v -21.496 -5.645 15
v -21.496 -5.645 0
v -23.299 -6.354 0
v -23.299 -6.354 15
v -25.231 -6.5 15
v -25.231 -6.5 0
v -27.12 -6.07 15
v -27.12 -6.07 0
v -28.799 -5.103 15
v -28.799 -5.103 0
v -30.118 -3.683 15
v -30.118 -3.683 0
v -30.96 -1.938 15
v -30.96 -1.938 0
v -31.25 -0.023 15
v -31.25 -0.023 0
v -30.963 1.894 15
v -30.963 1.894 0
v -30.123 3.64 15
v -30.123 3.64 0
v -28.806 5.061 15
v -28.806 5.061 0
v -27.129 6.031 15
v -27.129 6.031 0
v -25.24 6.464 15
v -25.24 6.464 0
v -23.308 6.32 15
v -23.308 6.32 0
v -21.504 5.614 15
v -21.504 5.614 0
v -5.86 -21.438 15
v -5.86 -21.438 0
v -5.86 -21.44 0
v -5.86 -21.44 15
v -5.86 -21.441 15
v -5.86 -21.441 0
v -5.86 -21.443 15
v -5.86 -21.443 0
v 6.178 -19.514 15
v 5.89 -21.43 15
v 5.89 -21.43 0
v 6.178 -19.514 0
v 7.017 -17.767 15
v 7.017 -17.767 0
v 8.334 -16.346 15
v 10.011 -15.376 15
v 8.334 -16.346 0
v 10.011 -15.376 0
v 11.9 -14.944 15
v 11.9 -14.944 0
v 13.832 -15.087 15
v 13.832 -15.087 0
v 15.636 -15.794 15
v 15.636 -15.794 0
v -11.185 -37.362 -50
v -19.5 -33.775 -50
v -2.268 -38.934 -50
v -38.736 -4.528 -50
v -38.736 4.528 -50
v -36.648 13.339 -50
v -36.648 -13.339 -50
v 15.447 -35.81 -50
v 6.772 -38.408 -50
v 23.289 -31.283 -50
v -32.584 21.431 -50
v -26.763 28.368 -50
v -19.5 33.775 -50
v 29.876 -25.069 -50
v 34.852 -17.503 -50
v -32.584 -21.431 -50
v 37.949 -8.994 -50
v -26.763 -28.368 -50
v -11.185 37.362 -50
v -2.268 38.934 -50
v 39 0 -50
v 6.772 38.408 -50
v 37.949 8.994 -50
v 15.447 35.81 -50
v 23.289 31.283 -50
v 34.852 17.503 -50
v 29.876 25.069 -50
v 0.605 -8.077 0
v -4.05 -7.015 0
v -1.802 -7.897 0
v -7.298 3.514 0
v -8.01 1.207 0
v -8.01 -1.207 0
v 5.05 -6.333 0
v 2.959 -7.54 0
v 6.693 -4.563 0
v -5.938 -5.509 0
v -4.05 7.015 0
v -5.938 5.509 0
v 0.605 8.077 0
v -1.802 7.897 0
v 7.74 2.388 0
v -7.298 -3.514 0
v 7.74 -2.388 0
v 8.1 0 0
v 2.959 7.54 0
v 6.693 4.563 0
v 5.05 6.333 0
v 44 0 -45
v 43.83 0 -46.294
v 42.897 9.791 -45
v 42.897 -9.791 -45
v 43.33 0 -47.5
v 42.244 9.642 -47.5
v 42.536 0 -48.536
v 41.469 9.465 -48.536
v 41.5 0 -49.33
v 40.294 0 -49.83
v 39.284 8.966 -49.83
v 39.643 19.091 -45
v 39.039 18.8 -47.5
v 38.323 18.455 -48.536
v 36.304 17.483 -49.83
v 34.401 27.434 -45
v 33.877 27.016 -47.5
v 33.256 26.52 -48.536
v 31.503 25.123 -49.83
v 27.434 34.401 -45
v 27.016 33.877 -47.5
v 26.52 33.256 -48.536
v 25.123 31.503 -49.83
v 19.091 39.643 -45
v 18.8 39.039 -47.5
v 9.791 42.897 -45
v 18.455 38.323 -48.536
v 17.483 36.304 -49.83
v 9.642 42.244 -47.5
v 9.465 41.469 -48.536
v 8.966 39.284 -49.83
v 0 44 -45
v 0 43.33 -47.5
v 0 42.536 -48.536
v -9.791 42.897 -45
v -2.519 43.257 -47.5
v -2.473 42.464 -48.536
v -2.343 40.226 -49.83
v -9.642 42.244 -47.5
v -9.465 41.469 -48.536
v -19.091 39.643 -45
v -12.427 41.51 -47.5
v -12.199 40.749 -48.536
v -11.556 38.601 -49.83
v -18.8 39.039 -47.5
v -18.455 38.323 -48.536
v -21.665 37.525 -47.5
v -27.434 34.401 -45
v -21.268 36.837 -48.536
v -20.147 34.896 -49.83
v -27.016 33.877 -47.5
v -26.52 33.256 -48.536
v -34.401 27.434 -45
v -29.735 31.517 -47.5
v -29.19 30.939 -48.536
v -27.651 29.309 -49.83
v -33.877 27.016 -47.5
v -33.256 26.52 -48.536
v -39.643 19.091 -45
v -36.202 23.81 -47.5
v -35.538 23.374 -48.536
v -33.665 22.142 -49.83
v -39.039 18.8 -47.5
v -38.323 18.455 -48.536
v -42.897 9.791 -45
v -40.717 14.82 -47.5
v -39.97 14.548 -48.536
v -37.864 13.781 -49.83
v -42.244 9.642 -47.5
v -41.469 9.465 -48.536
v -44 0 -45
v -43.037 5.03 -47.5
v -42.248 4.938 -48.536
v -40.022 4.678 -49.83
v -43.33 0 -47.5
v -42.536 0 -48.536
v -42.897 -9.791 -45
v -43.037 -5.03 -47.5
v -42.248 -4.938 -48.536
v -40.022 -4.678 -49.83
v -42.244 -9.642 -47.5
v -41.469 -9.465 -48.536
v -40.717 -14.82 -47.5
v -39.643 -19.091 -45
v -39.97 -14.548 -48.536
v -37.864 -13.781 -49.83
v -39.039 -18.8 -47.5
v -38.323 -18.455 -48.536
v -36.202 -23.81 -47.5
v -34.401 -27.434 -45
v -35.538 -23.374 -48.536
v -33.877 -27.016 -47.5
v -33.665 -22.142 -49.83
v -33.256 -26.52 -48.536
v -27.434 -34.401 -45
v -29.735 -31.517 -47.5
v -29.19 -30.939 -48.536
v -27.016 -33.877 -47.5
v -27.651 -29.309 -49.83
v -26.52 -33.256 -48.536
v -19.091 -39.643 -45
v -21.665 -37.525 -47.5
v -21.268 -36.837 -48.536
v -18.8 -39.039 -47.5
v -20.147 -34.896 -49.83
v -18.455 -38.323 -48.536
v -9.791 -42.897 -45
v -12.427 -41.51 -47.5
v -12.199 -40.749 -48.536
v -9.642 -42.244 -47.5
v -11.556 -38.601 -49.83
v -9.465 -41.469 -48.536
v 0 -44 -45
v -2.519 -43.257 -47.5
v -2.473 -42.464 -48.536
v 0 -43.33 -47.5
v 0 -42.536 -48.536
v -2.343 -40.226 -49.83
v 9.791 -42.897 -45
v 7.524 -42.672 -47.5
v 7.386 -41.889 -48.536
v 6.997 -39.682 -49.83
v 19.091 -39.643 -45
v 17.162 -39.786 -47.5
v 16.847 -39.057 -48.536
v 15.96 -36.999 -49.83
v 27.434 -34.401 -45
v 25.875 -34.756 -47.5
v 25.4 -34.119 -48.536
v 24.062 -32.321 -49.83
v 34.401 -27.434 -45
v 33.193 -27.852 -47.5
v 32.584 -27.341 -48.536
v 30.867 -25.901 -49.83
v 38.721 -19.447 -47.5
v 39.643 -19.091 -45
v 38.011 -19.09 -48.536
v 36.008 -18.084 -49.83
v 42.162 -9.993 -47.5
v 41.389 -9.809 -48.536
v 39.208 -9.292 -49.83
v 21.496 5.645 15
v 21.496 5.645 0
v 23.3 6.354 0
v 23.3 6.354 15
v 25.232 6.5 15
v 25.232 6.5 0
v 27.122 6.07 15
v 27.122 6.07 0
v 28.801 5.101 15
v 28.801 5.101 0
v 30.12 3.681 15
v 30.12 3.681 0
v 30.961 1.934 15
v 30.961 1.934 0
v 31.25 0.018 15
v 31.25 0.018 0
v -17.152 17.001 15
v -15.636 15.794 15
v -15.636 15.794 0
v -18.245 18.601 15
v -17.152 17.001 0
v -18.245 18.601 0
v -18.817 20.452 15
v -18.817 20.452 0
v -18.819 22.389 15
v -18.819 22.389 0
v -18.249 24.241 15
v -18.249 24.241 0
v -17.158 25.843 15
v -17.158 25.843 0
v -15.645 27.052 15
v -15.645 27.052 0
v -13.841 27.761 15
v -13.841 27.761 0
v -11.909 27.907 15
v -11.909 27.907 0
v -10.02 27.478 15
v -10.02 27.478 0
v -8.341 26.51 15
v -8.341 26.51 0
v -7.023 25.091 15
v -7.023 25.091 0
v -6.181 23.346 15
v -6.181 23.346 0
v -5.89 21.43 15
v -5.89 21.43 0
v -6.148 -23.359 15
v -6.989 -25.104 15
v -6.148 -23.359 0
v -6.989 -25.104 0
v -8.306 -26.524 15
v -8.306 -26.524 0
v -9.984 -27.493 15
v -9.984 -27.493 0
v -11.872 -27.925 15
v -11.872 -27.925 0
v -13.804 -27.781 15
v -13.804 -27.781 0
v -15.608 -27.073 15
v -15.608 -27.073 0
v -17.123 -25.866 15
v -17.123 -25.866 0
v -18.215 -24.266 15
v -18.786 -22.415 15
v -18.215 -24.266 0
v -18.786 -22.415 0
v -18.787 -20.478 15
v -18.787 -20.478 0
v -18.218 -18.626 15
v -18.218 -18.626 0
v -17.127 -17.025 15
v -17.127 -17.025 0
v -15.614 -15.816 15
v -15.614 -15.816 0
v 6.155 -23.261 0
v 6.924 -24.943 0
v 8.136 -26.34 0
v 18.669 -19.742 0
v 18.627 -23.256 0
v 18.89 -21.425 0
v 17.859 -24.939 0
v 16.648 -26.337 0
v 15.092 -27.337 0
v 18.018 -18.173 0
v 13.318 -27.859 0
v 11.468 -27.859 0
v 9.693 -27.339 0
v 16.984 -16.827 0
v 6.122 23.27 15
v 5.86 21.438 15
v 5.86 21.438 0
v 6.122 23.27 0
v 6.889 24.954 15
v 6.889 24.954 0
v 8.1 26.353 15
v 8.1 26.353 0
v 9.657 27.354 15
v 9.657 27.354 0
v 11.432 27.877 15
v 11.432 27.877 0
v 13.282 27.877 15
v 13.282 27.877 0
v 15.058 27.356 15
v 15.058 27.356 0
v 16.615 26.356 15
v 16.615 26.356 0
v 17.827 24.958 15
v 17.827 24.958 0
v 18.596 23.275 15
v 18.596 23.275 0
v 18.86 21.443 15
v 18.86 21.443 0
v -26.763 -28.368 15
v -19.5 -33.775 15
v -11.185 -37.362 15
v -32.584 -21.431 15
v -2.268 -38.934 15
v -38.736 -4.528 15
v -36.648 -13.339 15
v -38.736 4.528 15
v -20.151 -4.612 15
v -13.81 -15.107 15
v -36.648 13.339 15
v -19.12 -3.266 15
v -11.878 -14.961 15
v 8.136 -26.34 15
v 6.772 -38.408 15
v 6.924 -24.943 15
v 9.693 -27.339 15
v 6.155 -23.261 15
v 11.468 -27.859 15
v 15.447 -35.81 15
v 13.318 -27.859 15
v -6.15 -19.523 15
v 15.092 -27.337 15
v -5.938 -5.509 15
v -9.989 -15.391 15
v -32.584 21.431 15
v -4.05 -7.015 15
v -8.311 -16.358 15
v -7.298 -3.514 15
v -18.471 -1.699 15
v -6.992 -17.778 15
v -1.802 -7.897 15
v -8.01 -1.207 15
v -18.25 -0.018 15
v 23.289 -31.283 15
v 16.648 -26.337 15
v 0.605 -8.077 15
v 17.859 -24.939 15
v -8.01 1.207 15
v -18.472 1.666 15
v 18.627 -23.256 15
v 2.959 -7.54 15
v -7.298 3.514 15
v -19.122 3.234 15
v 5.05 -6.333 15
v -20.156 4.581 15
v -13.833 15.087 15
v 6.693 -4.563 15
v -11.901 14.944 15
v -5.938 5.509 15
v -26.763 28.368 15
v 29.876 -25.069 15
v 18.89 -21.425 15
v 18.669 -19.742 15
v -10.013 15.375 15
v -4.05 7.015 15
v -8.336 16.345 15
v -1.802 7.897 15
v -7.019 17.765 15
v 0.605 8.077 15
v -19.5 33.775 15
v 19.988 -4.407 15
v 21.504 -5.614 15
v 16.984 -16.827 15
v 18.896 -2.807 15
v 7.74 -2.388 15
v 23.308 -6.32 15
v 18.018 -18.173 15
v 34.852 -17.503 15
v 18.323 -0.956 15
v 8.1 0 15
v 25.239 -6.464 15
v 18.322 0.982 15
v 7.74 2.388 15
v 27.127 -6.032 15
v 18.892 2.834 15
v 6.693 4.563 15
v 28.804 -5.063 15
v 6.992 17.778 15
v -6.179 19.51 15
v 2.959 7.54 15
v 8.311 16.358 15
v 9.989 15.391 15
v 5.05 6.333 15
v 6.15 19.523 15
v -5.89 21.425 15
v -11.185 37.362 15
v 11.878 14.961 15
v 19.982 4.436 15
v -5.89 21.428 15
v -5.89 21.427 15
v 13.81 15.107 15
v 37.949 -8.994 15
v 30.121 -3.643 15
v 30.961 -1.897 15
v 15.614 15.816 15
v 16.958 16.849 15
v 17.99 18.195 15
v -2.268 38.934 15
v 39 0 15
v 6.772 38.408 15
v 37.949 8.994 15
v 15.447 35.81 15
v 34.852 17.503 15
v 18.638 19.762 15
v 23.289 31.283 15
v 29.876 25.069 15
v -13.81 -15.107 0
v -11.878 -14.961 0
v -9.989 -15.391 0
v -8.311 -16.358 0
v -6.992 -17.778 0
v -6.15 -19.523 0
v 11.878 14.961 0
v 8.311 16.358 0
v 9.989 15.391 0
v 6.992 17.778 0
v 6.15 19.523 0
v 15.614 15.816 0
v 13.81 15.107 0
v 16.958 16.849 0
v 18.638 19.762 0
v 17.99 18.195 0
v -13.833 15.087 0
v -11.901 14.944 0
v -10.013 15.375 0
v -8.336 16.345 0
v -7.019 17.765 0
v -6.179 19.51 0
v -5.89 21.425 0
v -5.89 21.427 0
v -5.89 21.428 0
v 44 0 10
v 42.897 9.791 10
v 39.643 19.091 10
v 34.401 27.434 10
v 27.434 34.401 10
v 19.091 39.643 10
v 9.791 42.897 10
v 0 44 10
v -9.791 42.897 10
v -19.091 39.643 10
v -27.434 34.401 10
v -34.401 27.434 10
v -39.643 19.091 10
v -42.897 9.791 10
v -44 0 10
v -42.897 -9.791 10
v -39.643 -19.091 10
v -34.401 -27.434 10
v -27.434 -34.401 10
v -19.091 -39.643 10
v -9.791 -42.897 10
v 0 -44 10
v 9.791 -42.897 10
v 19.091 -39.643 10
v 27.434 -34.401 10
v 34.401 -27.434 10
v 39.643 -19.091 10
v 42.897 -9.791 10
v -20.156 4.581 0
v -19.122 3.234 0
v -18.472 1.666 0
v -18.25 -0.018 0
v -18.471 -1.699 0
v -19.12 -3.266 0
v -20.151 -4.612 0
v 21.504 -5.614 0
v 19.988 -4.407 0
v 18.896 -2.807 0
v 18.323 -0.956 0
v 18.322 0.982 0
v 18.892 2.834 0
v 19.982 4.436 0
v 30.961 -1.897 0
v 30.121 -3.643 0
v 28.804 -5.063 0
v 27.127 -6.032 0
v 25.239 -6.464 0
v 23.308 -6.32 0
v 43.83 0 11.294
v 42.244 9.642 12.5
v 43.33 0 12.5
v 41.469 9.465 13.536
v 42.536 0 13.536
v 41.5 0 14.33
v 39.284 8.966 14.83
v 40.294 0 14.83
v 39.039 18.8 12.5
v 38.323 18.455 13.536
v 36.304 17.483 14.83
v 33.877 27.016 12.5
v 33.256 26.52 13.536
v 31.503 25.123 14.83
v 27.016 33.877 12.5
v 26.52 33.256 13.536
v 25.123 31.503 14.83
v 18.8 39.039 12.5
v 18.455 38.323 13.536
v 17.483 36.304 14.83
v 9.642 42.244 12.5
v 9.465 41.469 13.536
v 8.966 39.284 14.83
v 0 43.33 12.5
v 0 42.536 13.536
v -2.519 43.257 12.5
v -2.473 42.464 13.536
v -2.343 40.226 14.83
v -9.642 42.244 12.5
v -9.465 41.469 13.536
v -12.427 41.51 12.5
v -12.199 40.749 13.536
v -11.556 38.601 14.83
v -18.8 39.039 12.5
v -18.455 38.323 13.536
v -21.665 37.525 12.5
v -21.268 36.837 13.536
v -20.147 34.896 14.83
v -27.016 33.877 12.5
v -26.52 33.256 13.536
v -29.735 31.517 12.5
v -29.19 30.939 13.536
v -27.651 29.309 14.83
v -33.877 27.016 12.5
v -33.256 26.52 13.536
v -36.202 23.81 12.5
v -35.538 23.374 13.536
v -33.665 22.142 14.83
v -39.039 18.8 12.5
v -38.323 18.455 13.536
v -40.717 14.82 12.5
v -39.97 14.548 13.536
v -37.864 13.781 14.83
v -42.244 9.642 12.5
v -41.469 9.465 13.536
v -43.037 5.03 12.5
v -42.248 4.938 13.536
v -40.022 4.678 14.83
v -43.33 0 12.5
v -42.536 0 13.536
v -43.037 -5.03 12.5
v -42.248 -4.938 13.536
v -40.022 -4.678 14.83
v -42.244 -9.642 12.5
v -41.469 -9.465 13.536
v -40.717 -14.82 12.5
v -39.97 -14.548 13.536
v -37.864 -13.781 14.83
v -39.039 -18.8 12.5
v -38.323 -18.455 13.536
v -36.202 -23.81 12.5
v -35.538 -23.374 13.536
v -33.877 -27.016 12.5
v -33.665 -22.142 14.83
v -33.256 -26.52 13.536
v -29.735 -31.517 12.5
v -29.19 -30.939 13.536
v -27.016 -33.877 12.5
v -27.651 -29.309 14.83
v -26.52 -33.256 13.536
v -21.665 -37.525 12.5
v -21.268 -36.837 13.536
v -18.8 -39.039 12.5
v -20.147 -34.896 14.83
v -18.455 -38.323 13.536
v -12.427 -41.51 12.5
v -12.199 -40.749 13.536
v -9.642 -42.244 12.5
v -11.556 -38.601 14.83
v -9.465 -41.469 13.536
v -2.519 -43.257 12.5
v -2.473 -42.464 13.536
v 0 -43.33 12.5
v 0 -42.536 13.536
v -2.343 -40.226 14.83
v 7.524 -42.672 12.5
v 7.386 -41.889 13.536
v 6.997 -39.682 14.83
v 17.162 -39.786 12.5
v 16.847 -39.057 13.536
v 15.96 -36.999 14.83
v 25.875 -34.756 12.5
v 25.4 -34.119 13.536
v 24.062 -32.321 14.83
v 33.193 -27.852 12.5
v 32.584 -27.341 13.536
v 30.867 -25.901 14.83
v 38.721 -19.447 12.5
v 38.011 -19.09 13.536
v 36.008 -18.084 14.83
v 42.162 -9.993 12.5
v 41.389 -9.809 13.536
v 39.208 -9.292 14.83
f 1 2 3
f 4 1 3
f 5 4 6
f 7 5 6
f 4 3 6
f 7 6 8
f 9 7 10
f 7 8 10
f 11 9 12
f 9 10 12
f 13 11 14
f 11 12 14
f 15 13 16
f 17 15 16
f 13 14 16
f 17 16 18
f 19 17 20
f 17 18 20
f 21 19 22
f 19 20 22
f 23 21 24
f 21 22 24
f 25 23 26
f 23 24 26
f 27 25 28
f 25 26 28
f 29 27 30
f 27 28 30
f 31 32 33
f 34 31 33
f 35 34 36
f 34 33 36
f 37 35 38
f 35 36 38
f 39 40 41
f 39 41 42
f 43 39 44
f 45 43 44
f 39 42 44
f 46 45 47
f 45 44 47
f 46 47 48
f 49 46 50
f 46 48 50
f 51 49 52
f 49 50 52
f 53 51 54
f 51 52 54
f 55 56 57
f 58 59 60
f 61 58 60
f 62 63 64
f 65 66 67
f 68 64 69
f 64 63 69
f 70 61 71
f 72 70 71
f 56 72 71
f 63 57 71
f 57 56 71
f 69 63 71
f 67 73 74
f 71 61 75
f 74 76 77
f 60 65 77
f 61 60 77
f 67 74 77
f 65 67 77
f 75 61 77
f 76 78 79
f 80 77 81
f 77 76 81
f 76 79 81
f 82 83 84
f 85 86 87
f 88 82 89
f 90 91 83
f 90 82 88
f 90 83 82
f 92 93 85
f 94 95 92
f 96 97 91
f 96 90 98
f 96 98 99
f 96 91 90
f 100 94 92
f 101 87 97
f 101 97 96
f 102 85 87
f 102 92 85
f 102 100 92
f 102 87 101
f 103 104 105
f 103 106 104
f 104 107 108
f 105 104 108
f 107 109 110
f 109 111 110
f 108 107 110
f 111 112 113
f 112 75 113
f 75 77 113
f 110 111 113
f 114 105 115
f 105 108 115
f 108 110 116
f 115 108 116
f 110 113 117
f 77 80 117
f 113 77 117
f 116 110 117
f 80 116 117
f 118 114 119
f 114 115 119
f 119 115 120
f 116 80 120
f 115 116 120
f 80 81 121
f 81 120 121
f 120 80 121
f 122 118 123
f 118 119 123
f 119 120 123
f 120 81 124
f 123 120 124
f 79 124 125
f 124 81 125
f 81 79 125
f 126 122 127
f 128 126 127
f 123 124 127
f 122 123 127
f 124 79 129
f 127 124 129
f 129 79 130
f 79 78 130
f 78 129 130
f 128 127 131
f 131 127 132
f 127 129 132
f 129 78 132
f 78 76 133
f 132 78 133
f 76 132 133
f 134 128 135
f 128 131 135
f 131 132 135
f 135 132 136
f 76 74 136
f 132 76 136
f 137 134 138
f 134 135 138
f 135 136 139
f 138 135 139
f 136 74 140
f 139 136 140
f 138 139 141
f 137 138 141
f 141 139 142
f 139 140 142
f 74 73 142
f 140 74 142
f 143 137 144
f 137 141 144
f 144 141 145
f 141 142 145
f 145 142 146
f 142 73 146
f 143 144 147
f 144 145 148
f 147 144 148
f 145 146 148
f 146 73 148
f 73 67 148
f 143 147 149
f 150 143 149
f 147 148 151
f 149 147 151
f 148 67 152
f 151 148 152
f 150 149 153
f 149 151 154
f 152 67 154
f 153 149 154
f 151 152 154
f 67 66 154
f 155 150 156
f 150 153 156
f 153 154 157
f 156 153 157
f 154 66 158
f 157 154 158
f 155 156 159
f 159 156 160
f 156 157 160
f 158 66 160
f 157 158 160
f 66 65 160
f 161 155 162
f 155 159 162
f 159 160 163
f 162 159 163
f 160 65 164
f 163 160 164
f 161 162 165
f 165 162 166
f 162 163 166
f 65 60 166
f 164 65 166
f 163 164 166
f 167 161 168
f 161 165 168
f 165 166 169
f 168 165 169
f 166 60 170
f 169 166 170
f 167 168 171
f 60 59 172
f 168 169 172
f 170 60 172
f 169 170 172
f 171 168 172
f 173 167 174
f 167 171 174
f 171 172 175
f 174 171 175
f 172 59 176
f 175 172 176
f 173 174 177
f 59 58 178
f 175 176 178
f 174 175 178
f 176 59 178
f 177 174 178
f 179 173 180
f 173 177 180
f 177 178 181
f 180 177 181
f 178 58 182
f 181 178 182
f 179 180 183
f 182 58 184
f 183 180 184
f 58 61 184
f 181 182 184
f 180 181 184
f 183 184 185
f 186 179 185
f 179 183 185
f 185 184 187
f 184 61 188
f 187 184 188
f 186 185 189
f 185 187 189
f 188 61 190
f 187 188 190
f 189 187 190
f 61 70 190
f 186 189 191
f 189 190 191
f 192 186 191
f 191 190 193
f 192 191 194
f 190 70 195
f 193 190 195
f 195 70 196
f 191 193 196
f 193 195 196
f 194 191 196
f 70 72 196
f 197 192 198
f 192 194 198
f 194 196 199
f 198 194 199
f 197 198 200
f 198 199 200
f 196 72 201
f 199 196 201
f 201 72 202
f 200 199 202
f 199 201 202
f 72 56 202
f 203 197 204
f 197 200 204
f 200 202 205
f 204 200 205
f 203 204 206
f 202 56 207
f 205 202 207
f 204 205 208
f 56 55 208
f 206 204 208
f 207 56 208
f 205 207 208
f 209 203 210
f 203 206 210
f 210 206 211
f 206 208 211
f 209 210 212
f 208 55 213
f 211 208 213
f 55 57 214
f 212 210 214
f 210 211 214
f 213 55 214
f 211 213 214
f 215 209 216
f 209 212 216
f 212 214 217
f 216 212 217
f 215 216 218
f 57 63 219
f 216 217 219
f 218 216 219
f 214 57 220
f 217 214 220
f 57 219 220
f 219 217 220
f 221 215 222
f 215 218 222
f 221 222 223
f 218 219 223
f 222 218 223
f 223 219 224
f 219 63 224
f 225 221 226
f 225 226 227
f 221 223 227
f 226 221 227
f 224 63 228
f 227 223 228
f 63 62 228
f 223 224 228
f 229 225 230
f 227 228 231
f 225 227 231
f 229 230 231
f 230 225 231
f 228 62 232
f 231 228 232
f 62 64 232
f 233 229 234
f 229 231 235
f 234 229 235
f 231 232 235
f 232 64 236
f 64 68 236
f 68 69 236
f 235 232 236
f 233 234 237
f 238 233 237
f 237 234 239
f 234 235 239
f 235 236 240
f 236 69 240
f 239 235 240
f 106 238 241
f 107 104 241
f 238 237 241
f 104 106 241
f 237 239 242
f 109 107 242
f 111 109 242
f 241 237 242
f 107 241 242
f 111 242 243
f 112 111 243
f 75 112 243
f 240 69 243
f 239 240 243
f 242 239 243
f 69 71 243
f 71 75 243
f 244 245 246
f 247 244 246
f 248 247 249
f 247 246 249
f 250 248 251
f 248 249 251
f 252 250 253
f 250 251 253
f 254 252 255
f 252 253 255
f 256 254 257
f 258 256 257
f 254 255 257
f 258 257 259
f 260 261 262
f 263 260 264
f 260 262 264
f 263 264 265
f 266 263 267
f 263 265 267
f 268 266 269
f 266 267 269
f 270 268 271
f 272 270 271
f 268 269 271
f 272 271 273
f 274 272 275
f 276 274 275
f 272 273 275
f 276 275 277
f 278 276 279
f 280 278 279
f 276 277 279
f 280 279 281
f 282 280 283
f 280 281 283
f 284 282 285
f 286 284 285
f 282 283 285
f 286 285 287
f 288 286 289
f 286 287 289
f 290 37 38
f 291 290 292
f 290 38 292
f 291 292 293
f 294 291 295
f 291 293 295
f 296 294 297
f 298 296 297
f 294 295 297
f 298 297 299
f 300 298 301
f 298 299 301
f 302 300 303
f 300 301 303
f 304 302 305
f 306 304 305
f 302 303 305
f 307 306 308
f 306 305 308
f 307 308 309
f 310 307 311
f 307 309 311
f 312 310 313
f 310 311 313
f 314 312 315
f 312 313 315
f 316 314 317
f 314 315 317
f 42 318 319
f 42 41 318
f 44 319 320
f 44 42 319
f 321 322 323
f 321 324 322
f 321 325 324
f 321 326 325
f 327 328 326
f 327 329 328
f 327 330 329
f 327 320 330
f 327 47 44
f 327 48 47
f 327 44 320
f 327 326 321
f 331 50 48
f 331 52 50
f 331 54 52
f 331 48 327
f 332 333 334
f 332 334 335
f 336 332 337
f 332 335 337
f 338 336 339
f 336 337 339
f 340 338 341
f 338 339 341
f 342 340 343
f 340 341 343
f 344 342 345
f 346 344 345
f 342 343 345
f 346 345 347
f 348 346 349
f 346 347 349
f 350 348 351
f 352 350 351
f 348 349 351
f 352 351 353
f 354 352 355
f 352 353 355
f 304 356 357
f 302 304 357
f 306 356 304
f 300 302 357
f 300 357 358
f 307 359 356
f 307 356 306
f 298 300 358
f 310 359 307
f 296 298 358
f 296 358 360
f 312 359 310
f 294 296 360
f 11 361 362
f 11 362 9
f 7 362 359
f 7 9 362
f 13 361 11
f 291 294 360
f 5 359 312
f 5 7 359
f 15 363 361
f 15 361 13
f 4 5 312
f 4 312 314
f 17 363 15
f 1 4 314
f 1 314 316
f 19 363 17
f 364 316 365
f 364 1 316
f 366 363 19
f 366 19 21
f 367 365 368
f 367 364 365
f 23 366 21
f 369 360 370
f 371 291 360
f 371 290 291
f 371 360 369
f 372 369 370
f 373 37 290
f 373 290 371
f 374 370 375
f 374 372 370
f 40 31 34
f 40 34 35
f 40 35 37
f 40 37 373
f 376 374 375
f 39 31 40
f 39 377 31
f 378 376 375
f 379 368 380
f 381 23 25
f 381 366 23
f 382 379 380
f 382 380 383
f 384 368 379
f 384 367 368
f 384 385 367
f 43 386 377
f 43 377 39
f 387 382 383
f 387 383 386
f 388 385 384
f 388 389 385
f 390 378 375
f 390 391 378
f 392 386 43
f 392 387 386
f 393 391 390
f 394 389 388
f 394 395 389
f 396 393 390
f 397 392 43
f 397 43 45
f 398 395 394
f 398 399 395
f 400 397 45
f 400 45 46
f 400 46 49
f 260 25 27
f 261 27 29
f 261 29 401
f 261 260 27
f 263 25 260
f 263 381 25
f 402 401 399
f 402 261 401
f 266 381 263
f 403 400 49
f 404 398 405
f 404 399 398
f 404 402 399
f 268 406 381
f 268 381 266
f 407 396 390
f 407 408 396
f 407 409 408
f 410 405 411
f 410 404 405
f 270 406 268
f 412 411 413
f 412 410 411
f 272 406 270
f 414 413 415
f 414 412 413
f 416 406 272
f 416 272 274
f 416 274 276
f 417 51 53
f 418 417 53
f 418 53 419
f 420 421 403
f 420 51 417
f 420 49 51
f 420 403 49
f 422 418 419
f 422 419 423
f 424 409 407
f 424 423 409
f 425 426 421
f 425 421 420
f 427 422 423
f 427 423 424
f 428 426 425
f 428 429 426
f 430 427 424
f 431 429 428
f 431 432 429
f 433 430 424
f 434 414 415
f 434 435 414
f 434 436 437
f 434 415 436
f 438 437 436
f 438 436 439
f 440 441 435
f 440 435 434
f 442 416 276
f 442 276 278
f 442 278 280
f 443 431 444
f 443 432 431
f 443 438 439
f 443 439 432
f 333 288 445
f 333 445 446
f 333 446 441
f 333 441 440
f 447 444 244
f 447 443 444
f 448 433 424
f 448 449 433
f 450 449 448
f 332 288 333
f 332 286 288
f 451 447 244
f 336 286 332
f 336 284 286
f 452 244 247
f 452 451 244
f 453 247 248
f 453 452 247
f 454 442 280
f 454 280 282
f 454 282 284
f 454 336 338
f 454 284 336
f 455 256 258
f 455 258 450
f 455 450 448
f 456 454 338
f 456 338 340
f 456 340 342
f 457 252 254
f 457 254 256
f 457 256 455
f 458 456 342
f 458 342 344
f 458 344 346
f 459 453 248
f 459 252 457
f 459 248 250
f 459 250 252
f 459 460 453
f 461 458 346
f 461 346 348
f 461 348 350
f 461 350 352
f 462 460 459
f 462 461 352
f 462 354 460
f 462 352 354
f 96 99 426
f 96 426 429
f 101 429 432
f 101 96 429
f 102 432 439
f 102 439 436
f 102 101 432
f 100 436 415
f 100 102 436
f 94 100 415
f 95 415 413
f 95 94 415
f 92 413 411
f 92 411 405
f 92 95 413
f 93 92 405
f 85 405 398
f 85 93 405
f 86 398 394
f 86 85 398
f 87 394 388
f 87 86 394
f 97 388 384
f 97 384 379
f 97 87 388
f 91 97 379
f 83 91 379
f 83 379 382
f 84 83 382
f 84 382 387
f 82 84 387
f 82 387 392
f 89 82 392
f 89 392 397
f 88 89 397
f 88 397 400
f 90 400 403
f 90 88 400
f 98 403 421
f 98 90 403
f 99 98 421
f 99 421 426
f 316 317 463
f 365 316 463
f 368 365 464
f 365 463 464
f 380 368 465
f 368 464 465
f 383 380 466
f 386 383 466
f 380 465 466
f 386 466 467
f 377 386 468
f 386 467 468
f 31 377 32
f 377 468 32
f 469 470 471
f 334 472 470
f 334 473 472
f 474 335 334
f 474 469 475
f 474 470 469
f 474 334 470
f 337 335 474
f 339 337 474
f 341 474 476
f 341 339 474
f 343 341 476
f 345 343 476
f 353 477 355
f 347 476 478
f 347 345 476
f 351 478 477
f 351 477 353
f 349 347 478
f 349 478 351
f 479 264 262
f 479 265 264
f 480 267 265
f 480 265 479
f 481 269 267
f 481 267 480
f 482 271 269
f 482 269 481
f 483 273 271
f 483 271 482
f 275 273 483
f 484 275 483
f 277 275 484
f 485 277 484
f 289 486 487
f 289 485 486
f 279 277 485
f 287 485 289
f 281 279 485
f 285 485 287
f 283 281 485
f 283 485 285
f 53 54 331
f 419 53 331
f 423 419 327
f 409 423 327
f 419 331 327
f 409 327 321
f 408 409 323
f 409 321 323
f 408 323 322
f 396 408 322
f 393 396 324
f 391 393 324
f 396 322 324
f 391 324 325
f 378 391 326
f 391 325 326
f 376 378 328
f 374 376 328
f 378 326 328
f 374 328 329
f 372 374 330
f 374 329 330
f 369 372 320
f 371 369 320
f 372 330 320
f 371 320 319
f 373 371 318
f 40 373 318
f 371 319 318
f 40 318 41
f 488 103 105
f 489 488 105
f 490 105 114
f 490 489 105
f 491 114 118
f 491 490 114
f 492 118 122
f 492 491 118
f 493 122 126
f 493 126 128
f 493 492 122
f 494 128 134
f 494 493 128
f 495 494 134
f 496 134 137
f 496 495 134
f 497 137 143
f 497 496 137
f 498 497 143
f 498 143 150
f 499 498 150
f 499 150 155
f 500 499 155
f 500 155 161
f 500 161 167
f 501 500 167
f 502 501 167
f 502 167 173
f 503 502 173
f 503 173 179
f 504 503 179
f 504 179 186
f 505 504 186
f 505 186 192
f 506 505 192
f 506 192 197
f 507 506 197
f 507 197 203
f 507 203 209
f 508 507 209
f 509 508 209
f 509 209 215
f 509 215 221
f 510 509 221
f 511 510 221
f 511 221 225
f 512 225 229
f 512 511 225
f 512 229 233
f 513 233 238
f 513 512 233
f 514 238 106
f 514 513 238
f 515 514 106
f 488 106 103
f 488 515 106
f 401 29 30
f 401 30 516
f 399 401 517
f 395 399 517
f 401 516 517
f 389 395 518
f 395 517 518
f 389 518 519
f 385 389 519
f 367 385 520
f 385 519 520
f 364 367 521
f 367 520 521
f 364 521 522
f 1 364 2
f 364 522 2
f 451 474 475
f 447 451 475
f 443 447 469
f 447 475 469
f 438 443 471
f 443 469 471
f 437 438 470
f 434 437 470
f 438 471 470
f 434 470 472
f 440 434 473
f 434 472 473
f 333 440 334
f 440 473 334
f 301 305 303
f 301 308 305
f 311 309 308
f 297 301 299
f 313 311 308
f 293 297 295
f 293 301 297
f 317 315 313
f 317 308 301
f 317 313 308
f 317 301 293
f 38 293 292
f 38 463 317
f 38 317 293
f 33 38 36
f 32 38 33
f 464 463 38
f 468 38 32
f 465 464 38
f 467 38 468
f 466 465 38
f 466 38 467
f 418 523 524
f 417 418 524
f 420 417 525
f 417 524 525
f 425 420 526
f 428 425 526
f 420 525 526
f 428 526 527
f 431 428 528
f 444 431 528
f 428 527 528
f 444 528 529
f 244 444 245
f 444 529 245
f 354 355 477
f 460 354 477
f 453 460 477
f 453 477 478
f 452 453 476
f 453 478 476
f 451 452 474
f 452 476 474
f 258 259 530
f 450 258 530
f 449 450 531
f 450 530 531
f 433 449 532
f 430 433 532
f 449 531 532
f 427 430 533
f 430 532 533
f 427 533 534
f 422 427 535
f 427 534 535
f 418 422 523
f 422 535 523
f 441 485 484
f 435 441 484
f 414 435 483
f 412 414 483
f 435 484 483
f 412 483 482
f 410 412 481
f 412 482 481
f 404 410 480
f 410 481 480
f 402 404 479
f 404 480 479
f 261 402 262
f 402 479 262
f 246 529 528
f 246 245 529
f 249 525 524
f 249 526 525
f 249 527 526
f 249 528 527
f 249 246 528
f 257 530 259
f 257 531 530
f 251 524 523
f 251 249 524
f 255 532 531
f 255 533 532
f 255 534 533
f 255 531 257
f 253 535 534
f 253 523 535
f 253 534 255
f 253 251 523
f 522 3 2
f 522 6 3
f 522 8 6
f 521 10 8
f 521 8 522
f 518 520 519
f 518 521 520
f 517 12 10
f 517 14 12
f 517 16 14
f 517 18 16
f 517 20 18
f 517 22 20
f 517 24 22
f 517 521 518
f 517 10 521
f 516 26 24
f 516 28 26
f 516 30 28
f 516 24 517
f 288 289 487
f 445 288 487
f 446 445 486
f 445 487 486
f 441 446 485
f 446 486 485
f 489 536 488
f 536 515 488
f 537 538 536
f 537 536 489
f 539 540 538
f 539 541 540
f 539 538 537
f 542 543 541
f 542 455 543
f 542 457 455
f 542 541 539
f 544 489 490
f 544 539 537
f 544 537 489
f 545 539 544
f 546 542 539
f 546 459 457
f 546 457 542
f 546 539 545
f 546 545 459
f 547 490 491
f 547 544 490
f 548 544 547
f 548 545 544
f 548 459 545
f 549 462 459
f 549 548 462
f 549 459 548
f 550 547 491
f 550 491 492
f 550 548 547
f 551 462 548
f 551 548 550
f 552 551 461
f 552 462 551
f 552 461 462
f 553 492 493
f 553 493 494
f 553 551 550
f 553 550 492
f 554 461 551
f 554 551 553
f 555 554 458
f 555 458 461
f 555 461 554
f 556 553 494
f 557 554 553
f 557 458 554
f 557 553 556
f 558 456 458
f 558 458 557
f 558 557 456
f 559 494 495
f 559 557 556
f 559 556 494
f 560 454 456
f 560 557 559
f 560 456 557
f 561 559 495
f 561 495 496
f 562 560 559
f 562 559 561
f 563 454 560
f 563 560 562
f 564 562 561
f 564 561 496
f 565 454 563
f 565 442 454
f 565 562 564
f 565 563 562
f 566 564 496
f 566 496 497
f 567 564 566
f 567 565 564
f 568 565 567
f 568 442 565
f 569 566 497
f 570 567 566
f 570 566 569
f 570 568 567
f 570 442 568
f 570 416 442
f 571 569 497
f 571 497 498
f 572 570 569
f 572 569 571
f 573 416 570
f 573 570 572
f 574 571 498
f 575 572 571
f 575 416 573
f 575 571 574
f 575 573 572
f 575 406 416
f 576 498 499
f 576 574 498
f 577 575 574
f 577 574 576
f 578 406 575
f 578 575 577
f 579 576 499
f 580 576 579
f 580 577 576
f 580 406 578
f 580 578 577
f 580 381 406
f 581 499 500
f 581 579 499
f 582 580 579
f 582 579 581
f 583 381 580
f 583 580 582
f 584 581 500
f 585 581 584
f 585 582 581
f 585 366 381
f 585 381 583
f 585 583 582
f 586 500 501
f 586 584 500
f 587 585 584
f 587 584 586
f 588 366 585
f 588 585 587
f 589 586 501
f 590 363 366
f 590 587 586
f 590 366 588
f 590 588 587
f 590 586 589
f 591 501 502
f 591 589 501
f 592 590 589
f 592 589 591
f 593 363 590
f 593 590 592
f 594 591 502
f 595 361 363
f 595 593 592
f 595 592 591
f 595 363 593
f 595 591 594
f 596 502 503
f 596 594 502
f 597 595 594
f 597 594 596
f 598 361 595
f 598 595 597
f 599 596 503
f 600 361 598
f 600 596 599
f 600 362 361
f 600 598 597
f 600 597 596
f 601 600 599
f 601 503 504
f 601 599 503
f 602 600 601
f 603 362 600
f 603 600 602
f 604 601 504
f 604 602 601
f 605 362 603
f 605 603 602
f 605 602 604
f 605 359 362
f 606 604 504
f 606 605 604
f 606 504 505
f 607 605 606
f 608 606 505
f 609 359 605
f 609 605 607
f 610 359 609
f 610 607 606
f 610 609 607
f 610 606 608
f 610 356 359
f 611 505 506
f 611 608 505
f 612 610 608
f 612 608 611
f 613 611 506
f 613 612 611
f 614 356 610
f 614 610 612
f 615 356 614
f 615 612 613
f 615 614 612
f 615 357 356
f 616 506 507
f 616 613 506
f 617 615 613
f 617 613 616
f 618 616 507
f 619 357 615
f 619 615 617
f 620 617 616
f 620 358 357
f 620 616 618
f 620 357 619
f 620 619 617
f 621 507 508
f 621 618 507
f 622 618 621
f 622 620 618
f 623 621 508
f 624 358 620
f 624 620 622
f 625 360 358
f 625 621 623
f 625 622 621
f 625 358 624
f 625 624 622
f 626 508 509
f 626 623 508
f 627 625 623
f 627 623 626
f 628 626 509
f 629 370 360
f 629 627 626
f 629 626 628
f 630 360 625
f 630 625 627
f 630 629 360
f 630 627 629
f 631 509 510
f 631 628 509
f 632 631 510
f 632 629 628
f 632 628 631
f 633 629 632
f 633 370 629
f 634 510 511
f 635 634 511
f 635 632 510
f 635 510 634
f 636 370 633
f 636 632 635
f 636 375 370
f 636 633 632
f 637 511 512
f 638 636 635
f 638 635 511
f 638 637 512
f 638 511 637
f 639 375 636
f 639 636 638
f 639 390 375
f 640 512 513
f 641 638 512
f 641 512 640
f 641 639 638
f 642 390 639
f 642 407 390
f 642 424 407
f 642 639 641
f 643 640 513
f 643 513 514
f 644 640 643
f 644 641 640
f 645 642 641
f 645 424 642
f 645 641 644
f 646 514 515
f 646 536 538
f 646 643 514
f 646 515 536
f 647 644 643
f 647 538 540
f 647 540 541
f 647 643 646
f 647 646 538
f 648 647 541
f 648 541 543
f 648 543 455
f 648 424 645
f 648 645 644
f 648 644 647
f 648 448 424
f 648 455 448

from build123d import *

# Parameters (mm, degrees)
F0_R     = 44
F0_R_2   = 8.1
F1_DEPTH = 15
F2_DEPTH = 50
F3_R     = 5


with BuildPart() as f1:
    # F0 (on Top) → F1 (new body)
    with BuildSketch(Plane.XY):
        Circle(F0_R)
        with BuildLine():
            ThreePointArc((31.2499935607, 0.017853412), (28.0020236485, -5.6101391527), (21.5040550044, -5.6136546355))
            Line((21.5040550044, -5.6136546355), (15.636396845, -15.7936884136))
            ThreePointArc((15.636396845, -15.7936884136), (18.0184508533, -18.1731663733), (18.8904582887, -21.4251964611))
            ThreePointArc((18.8904582887, -21.4251964611), (12.3928026762, -27.9251960383), (5.8904599798, -21.429885236))
            Line((5.8904599798, -21.429885236), (-5.8595369632, -21.4383610982))
            ThreePointArc((-5.8595369632, -21.4383610982), (-5.8595356948, -21.4407054855), (-5.8595352721, -21.4430498731))
            ThreePointArc((-5.8595352721, -21.4430498731), (-15.6075047615, -27.0733868253), (-15.6135950246, -15.8162306005))
            Line((-15.6135950246, -15.8162306005), (-21.4959338081, -5.6446726846))
            ThreePointArc((-21.4959338081, -5.6446726846), (-31.2499918696, -0.0225421868), (-21.5040550044, 5.6136546355))
            Line((-21.5040550044, 5.6136546355), (-15.636396845, 15.7936884136))
            ThreePointArc((-15.636396845, 15.7936884136), (-15.6445180412, 27.0520157337), (-5.8904599798, 21.429885236))
            Line((-5.8904599798, 21.429885236), (5.8595369632, 21.4383610982))
            ThreePointArc((5.8595369632, 21.4383610982), (12.3571908845, 27.9430494503), (18.8595352721, 21.4430498731))
            ThreePointArc((18.8595352721, 21.4430498731), (17.9898722243, 18.1950803837), (15.6135950246, 15.8162306005))
            Line((15.6135950246, 15.8162306005), (21.4959338081, 5.6446726846))
            ThreePointArc((21.4959338081, 5.6446726846), (27.9979630501, 5.6481903642), (31.2499935607, 0.017853412))
        make_face(mode=Mode.SUBTRACT)
        with BuildLine():
            Line((15.636396845, -15.7936884136), (21.5040550044, -5.6136546355))
            ThreePointArc((21.5040550044, -5.6136546355), (18.2499952518, 0.0131646371), (21.4959338081, 5.6446726846))
            Line((21.4959338081, 5.6446726846), (15.6135950246, 15.8162306005))
            ThreePointArc((15.6135950246, 15.8162306005), (9.1135967158, 15.8115418256), (5.8595369632, 21.4383610982))
            Line((5.8595369632, 21.4383610982), (-5.8904599798, 21.429885236))
            ThreePointArc((-5.8904599798, 21.429885236), (-5.8904587114, 21.4275408487), (-5.8904582887, 21.4251964611))
            ThreePointArc((-5.8904582887, 21.4251964611), (-9.1384282009, 15.7972038964), (-15.636396845, 15.7936884136))
            Line((-15.636396845, 15.7936884136), (-21.5040550044, 5.6136546355))
            ThreePointArc((-21.5040550044, 5.6136546355), (-19.1220009961, 3.2341766758), (-18.2499935607, -0.017853412))
            ThreePointArc((-18.2499935607, -0.017853412), (-19.1196566085, -3.2658229014), (-21.4959338081, -5.6446726846))
            Line((-21.4959338081, -5.6446726846), (-15.6135950246, -15.8162306005))
            ThreePointArc((-15.6135950246, -15.8162306005), (-9.1135967158, -15.8115418256), (-5.8595369632, -21.4383610982))
            Line((-5.8595369632, -21.4383610982), (5.8904599798, -21.429885236))
            ThreePointArc((5.8904599798, -21.429885236), (9.1363985361, -15.7983771885), (15.636396845, -15.7936884136))
        make_face()
        Circle(F0_R_2, mode=Mode.SUBTRACT)
    extrude(amount=F1_DEPTH)

    # F0 (on Top) → F2 (join)
    with BuildSketch(Plane.XY):
        Circle(F0_R)
        with BuildLine():
            ThreePointArc((31.2499935607, 0.017853412), (28.0020236485, -5.6101391527), (21.5040550044, -5.6136546355))
            Line((21.5040550044, -5.6136546355), (15.636396845, -15.7936884136))
            ThreePointArc((15.636396845, -15.7936884136), (18.0184508533, -18.1731663733), (18.8904582887, -21.4251964611))
            ThreePointArc((18.8904582887, -21.4251964611), (12.3928026762, -27.9251960383), (5.8904599798, -21.429885236))
            Line((5.8904599798, -21.429885236), (-5.8595369632, -21.4383610982))
            ThreePointArc((-5.8595369632, -21.4383610982), (-5.8595356948, -21.4407054855), (-5.8595352721, -21.4430498731))
            ThreePointArc((-5.8595352721, -21.4430498731), (-15.6075047615, -27.0733868253), (-15.6135950246, -15.8162306005))
            Line((-15.6135950246, -15.8162306005), (-21.4959338081, -5.6446726846))
            ThreePointArc((-21.4959338081, -5.6446726846), (-31.2499918696, -0.0225421868), (-21.5040550044, 5.6136546355))
            Line((-21.5040550044, 5.6136546355), (-15.636396845, 15.7936884136))
            ThreePointArc((-15.636396845, 15.7936884136), (-15.6445180412, 27.0520157337), (-5.8904599798, 21.429885236))
            Line((-5.8904599798, 21.429885236), (5.8595369632, 21.4383610982))
            ThreePointArc((5.8595369632, 21.4383610982), (12.3571908845, 27.9430494503), (18.8595352721, 21.4430498731))
            ThreePointArc((18.8595352721, 21.4430498731), (17.9898722243, 18.1950803837), (15.6135950246, 15.8162306005))
            Line((15.6135950246, 15.8162306005), (21.4959338081, 5.6446726846))
            ThreePointArc((21.4959338081, 5.6446726846), (27.9979630501, 5.6481903642), (31.2499935607, 0.017853412))
        make_face(mode=Mode.SUBTRACT)
        with BuildLine():
            Line((15.636396845, -15.7936884136), (21.5040550044, -5.6136546355))
            ThreePointArc((21.5040550044, -5.6136546355), (18.2499952518, 0.0131646371), (21.4959338081, 5.6446726846))
            Line((21.4959338081, 5.6446726846), (15.6135950246, 15.8162306005))
            ThreePointArc((15.6135950246, 15.8162306005), (9.1135967158, 15.8115418256), (5.8595369632, 21.4383610982))
            Line((5.8595369632, 21.4383610982), (-5.8904599798, 21.429885236))
            ThreePointArc((-5.8904599798, 21.429885236), (-5.8904587114, 21.4275408487), (-5.8904582887, 21.4251964611))
            ThreePointArc((-5.8904582887, 21.4251964611), (-9.1384282009, 15.7972038964), (-15.636396845, 15.7936884136))
            Line((-15.636396845, 15.7936884136), (-21.5040550044, 5.6136546355))
            ThreePointArc((-21.5040550044, 5.6136546355), (-19.1220009961, 3.2341766758), (-18.2499935607, -0.017853412))
            ThreePointArc((-18.2499935607, -0.017853412), (-19.1196566085, -3.2658229014), (-21.4959338081, -5.6446726846))
            Line((-21.4959338081, -5.6446726846), (-15.6135950246, -15.8162306005))
            ThreePointArc((-15.6135950246, -15.8162306005), (-9.1135967158, -15.8115418256), (-5.8595369632, -21.4383610982))
            Line((-5.8595369632, -21.4383610982), (5.8904599798, -21.429885236))
            ThreePointArc((5.8904599798, -21.429885236), (9.1363985361, -15.7983771885), (15.636396845, -15.7936884136))
        make_face()
        Circle(F0_R_2, mode=Mode.SUBTRACT)
        Circle(F0_R_2)
        with BuildLine():
            ThreePointArc((-5.8595352721, -21.4430498731), (-5.8595356948, -21.4407054855), (-5.8595369632, -21.4383610982))
            Line((-5.8595369632, -21.4383610982), (-12.3595352721, -21.4430498731))
            Line((-12.3595352721, -21.4430498731), (-15.6135950246, -15.8162306005))
            ThreePointArc((-15.6135950246, -15.8162306005), (-15.6075047615, -27.0733868253), (-5.8595352721, -21.4430498731))
        make_face()
        with BuildLine():
            ThreePointArc((-21.5040550044, 5.6136546355), (-31.2499918696, -0.0225421868), (-21.4959338081, -5.6446726846))
            Line((-21.4959338081, -5.6446726846), (-24.7499935607, -0.017853412))
            Line((-24.7499935607, -0.017853412), (-21.5040550044, 5.6136546355))
        make_face()
        with BuildLine():
            ThreePointArc((18.8904582887, -21.4251964611), (18.0184508533, -18.1731663733), (15.636396845, -15.7936884136))
            Line((15.636396845, -15.7936884136), (12.3904582887, -21.4251964611))
            Line((12.3904582887, -21.4251964611), (5.8904599798, -21.429885236))
            ThreePointArc((5.8904599798, -21.429885236), (12.3928026762, -27.9251960383), (18.8904582887, -21.4251964611))
        make_face()
        with BuildLine():
            Line((21.4959338081, 5.6446726846), (24.7499935607, 0.017853412))
            Line((24.7499935607, 0.017853412), (21.5040550044, -5.6136546355))
            ThreePointArc((21.5040550044, -5.6136546355), (28.0020236485, -5.6101391527), (31.2499935607, 0.017853412))
            ThreePointArc((31.2499935607, 0.017853412), (27.9979630501, 5.6481903642), (21.4959338081, 5.6446726846))
        make_face()
        with BuildLine():
            Line((12.3595352721, 21.4430498731), (15.6135950246, 15.8162306005))
            ThreePointArc((15.6135950246, 15.8162306005), (17.9898722243, 18.1950803837), (18.8595352721, 21.4430498731))
            ThreePointArc((18.8595352721, 21.4430498731), (12.3571908845, 27.9430494503), (5.8595369632, 21.4383610982))
            Line((5.8595369632, 21.4383610982), (12.3595352721, 21.4430498731))
        make_face()
        with BuildLine():
            Line((-12.3904582887, 21.4251964611), (-5.8904599798, 21.429885236))
            ThreePointArc((-5.8904599798, 21.429885236), (-15.6445180412, 27.0520157337), (-15.636396845, 15.7936884136))
            Line((-15.636396845, 15.7936884136), (-12.3904582887, 21.4251964611))
        make_face()
        with BuildLine():
            Line((-12.3595352721, -21.4430498731), (-5.8595369632, -21.4383610982))
            ThreePointArc((-5.8595369632, -21.4383610982), (-9.1135967158, -15.8115418256), (-15.6135950246, -15.8162306005))
            Line((-15.6135950246, -15.8162306005), (-12.3595352721, -21.4430498731))
        make_face()
        with BuildLine():
            Line((-24.7499935607, -0.017853412), (-21.4959338081, -5.6446726846))
            ThreePointArc((-21.4959338081, -5.6446726846), (-19.1196566085, -3.2658229014), (-18.2499935607, -0.017853412))
            ThreePointArc((-18.2499935607, -0.017853412), (-19.1220009961, 3.2341766758), (-21.5040550044, 5.6136546355))
            Line((-21.5040550044, 5.6136546355), (-24.7499935607, -0.017853412))
        make_face()
        with BuildLine():
            Line((12.3904582887, -21.4251964611), (15.636396845, -15.7936884136))
            ThreePointArc((15.636396845, -15.7936884136), (9.1363985361, -15.7983771885), (5.8904599798, -21.429885236))
            Line((5.8904599798, -21.429885236), (12.3904582887, -21.4251964611))
        make_face()
        with BuildLine():
            Line((21.5040550044, -5.6136546355), (24.7499935607, 0.017853412))
            Line((24.7499935607, 0.017853412), (21.4959338081, 5.6446726846))
            ThreePointArc((21.4959338081, 5.6446726846), (18.2499952518, 0.0131646371), (21.5040550044, -5.6136546355))
        make_face()
        with BuildLine():
            ThreePointArc((-5.8904582887, 21.4251964611), (-5.8904587114, 21.4275408487), (-5.8904599798, 21.429885236))
            Line((-5.8904599798, 21.429885236), (-12.3904582887, 21.4251964611))
            Line((-12.3904582887, 21.4251964611), (-15.636396845, 15.7936884136))
            ThreePointArc((-15.636396845, 15.7936884136), (-9.1384282009, 15.7972038964), (-5.8904582887, 21.4251964611))
        make_face()
        with BuildLine():
            ThreePointArc((5.8595369632, 21.4383610982), (9.1135967158, 15.8115418256), (15.6135950246, 15.8162306005))
            Line((15.6135950246, 15.8162306005), (12.3595352721, 21.4430498731))
            Line((12.3595352721, 21.4430498731), (5.8595369632, 21.4383610982))
        make_face()
    extrude(amount=-F2_DEPTH)

    # F3
    f3_edges = [f1.edges().sort_by_distance(p)[0] for p in [
        (-44, 0, 15),
        (-44, 0, -50),
    ]]
    fillet(f3_edges, radius=F3_R)


solid = f1.part
